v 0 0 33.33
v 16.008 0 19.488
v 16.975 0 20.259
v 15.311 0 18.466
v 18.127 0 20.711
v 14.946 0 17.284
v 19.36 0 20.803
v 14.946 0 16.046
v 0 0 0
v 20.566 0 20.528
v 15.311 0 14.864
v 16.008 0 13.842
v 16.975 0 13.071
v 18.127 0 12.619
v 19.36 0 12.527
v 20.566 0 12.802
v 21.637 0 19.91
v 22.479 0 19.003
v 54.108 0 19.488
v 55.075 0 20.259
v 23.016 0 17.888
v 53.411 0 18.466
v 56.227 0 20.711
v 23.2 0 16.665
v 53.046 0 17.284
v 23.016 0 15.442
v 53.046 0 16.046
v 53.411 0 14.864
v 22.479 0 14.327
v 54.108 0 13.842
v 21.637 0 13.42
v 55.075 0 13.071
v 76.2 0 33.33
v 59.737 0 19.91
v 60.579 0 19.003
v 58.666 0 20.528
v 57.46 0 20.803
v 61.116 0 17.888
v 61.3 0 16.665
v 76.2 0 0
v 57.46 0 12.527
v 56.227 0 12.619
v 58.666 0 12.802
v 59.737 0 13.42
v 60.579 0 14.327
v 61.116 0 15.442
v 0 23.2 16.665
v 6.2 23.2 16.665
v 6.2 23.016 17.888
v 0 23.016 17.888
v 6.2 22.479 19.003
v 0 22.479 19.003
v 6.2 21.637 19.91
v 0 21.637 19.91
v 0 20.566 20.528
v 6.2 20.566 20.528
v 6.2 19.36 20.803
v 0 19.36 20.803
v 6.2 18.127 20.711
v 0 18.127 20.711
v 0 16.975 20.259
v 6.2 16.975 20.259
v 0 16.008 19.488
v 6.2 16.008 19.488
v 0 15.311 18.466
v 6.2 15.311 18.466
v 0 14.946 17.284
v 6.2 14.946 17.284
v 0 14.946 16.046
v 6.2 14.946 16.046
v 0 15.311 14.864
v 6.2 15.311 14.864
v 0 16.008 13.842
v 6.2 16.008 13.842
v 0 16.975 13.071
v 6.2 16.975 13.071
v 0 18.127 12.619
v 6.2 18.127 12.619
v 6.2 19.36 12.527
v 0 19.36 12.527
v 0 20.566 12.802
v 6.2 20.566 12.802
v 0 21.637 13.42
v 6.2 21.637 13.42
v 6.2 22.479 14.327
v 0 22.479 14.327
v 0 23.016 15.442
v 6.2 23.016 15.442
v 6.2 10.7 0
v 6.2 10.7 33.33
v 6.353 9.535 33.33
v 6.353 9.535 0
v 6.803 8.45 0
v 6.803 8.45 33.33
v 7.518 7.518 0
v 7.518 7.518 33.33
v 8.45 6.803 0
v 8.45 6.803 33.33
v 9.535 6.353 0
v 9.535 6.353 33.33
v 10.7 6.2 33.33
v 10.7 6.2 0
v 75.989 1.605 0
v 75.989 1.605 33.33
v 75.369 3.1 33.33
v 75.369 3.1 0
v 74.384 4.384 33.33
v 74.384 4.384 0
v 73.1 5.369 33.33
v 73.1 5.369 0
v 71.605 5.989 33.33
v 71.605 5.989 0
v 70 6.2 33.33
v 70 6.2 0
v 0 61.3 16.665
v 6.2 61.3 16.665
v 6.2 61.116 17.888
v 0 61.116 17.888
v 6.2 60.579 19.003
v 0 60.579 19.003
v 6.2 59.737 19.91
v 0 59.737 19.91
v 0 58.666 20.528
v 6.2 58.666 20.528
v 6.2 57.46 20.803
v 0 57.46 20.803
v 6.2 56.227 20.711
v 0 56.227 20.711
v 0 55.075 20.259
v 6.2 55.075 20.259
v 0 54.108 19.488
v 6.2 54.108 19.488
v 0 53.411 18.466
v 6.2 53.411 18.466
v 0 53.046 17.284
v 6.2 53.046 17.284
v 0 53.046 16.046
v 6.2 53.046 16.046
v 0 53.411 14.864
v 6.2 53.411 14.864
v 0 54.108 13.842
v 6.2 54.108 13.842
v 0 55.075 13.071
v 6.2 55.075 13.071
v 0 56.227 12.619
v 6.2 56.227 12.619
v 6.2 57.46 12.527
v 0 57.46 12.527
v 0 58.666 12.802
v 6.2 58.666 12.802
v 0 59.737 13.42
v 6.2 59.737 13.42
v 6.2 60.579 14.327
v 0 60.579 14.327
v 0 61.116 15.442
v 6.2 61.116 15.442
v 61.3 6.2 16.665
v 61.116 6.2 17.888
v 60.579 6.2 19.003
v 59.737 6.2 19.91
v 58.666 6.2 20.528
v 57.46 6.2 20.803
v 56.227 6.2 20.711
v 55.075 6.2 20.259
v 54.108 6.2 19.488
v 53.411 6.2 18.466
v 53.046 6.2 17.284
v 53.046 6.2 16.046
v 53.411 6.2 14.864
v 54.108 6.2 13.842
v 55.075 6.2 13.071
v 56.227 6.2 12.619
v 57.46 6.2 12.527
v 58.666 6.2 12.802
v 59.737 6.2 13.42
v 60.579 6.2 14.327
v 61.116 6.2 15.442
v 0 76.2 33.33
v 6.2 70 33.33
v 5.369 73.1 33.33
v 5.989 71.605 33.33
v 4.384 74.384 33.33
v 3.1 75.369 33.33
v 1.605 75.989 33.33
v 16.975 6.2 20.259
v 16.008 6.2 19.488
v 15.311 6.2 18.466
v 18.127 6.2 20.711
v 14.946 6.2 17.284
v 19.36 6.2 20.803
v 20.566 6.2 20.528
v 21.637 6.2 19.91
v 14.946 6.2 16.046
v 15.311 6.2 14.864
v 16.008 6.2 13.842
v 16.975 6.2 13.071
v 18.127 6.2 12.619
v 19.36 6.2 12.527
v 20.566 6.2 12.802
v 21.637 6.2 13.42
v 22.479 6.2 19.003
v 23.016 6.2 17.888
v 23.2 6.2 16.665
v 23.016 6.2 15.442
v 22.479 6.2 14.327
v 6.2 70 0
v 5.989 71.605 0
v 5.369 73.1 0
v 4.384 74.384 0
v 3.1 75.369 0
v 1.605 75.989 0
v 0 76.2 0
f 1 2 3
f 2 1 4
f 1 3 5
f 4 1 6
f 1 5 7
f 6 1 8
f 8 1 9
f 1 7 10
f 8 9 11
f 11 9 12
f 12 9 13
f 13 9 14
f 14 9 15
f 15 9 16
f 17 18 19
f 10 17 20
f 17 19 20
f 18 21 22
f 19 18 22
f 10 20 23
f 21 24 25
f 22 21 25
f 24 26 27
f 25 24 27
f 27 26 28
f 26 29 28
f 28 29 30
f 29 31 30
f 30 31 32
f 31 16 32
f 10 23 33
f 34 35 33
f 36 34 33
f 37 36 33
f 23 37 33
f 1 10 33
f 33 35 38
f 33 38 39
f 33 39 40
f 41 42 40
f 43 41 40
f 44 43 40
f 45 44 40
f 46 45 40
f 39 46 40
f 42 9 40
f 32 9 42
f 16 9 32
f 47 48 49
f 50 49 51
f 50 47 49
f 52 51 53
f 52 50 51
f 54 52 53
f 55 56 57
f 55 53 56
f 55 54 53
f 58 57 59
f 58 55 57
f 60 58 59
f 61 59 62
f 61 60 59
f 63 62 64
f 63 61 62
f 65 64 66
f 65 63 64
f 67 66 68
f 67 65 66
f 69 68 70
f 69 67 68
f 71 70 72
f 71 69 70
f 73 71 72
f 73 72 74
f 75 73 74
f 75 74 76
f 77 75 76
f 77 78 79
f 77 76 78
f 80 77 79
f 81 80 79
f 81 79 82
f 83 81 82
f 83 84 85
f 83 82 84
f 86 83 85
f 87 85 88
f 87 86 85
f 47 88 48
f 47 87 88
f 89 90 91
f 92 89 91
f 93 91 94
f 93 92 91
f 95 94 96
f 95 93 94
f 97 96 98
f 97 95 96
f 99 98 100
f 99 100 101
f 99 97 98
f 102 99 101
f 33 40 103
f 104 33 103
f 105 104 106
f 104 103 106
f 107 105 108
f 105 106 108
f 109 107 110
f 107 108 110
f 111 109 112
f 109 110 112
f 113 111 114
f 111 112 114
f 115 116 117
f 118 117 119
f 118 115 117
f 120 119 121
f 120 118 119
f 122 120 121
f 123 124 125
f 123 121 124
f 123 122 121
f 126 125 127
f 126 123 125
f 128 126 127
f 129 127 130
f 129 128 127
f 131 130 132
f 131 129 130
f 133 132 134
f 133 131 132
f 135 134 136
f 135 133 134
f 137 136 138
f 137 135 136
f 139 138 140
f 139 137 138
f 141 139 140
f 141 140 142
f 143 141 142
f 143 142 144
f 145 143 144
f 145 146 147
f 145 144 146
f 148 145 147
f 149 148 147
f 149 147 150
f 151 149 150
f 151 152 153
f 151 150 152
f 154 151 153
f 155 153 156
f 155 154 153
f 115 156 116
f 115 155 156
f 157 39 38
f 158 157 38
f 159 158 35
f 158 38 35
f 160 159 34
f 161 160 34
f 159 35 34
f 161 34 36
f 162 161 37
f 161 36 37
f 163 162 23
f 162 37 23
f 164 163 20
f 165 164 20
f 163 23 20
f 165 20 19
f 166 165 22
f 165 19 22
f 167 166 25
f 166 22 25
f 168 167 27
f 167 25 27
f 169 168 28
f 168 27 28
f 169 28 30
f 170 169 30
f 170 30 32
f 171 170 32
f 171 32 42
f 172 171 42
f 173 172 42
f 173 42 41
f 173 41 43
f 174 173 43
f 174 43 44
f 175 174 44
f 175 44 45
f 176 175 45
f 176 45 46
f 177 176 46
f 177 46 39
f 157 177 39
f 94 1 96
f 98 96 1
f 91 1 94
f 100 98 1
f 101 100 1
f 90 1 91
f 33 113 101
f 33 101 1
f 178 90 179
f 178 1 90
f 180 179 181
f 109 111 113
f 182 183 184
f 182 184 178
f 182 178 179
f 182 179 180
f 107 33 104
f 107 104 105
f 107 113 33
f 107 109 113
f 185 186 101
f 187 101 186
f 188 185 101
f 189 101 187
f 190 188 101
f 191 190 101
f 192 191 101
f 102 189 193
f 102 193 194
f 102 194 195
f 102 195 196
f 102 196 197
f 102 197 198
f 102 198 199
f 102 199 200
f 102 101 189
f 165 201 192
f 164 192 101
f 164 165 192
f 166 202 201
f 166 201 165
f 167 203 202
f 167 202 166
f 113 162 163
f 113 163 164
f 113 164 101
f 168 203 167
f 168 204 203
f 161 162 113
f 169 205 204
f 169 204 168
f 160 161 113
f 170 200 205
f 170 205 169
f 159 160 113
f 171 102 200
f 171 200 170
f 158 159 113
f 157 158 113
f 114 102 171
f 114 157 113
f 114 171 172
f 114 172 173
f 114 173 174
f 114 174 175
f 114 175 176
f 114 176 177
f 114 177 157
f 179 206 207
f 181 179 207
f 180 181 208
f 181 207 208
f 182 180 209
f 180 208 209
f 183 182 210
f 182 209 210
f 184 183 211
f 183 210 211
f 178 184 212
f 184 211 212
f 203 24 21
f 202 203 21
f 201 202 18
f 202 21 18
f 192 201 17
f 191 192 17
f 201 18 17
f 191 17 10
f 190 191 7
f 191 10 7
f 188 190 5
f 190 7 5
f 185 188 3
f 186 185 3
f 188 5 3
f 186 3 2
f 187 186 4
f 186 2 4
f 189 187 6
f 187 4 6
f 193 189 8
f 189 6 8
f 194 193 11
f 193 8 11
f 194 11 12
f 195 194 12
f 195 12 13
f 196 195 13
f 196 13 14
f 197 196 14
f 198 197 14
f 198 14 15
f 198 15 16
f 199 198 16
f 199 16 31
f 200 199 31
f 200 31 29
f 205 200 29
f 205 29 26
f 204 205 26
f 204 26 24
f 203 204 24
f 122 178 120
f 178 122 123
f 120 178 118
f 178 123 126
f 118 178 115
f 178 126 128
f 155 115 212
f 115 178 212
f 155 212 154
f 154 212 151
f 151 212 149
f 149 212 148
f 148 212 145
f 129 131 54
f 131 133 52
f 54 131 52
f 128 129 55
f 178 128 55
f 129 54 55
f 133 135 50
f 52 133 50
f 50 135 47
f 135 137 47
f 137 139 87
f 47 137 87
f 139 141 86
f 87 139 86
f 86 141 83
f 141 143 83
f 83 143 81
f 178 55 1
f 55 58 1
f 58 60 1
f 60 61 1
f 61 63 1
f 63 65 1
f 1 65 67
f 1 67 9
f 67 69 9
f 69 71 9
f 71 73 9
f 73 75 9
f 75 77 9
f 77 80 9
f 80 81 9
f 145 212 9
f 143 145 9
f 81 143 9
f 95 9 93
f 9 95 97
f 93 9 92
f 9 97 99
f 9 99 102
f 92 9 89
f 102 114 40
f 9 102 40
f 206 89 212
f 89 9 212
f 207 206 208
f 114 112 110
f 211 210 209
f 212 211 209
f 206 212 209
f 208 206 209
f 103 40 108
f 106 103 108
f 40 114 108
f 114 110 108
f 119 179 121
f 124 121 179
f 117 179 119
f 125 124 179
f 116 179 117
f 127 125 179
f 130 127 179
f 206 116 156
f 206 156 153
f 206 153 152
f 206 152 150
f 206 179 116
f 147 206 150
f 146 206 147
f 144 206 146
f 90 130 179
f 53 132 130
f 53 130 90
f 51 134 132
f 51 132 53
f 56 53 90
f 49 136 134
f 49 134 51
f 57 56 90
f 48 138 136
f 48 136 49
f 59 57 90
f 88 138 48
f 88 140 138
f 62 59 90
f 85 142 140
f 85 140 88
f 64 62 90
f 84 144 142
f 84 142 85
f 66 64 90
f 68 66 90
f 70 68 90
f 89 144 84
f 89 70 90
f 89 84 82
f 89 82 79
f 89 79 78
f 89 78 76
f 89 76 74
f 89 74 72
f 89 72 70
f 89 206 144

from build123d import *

# Parameters (mm, degrees)
PAD_DEPTH       = 33.33
SKETCH001_R     = 4.15
POCKET_DEPTH    = 76.201
SKETCH002_R     = 4.15
POCKET001_DEPTH = 76.201


with BuildPart() as part:
    # Sketch → Pad (new body)
    with BuildSketch(Plane.XY):
        with BuildLine():
            Line((0, 76.2), (0, 0))
            Line((0, 0), (76.2, 0))
            ThreePointArc((76.2, 0), (74.384062, 4.384062), (70, 6.2))
            Line((10.7, 6.2), (70, 6.2))
            ThreePointArc((6.2, 10.7), (7.518019, 7.518019), (10.7, 6.2))
            Line((6.2, 70), (6.2, 10.7))
            ThreePointArc((6.2, 70), (4.384062, 74.384062), (0, 76.2))
        make_face()
    extrude(amount=PAD_DEPTH)

    # Sketch001 → Pocket (cut, through all)
    with BuildSketch(Plane.XZ):
        with Locations((19.05, 16.665)):
            Circle(SKETCH001_R)
        with Locations((57.15, 16.665)):
            Circle(SKETCH001_R)
    extrude(amount=-POCKET_DEPTH, mode=Mode.SUBTRACT)

    # Sketch002 → Pocket001 (cut, through all)
    with BuildSketch(Plane.YZ):
        with Locations((19.05, 16.665)):
            Circle(SKETCH002_R)
        with Locations((57.15, 16.665)):
            Circle(SKETCH002_R)
    extrude(amount=POCKET001_DEPTH, mode=Mode.SUBTRACT)


solid = part.part
